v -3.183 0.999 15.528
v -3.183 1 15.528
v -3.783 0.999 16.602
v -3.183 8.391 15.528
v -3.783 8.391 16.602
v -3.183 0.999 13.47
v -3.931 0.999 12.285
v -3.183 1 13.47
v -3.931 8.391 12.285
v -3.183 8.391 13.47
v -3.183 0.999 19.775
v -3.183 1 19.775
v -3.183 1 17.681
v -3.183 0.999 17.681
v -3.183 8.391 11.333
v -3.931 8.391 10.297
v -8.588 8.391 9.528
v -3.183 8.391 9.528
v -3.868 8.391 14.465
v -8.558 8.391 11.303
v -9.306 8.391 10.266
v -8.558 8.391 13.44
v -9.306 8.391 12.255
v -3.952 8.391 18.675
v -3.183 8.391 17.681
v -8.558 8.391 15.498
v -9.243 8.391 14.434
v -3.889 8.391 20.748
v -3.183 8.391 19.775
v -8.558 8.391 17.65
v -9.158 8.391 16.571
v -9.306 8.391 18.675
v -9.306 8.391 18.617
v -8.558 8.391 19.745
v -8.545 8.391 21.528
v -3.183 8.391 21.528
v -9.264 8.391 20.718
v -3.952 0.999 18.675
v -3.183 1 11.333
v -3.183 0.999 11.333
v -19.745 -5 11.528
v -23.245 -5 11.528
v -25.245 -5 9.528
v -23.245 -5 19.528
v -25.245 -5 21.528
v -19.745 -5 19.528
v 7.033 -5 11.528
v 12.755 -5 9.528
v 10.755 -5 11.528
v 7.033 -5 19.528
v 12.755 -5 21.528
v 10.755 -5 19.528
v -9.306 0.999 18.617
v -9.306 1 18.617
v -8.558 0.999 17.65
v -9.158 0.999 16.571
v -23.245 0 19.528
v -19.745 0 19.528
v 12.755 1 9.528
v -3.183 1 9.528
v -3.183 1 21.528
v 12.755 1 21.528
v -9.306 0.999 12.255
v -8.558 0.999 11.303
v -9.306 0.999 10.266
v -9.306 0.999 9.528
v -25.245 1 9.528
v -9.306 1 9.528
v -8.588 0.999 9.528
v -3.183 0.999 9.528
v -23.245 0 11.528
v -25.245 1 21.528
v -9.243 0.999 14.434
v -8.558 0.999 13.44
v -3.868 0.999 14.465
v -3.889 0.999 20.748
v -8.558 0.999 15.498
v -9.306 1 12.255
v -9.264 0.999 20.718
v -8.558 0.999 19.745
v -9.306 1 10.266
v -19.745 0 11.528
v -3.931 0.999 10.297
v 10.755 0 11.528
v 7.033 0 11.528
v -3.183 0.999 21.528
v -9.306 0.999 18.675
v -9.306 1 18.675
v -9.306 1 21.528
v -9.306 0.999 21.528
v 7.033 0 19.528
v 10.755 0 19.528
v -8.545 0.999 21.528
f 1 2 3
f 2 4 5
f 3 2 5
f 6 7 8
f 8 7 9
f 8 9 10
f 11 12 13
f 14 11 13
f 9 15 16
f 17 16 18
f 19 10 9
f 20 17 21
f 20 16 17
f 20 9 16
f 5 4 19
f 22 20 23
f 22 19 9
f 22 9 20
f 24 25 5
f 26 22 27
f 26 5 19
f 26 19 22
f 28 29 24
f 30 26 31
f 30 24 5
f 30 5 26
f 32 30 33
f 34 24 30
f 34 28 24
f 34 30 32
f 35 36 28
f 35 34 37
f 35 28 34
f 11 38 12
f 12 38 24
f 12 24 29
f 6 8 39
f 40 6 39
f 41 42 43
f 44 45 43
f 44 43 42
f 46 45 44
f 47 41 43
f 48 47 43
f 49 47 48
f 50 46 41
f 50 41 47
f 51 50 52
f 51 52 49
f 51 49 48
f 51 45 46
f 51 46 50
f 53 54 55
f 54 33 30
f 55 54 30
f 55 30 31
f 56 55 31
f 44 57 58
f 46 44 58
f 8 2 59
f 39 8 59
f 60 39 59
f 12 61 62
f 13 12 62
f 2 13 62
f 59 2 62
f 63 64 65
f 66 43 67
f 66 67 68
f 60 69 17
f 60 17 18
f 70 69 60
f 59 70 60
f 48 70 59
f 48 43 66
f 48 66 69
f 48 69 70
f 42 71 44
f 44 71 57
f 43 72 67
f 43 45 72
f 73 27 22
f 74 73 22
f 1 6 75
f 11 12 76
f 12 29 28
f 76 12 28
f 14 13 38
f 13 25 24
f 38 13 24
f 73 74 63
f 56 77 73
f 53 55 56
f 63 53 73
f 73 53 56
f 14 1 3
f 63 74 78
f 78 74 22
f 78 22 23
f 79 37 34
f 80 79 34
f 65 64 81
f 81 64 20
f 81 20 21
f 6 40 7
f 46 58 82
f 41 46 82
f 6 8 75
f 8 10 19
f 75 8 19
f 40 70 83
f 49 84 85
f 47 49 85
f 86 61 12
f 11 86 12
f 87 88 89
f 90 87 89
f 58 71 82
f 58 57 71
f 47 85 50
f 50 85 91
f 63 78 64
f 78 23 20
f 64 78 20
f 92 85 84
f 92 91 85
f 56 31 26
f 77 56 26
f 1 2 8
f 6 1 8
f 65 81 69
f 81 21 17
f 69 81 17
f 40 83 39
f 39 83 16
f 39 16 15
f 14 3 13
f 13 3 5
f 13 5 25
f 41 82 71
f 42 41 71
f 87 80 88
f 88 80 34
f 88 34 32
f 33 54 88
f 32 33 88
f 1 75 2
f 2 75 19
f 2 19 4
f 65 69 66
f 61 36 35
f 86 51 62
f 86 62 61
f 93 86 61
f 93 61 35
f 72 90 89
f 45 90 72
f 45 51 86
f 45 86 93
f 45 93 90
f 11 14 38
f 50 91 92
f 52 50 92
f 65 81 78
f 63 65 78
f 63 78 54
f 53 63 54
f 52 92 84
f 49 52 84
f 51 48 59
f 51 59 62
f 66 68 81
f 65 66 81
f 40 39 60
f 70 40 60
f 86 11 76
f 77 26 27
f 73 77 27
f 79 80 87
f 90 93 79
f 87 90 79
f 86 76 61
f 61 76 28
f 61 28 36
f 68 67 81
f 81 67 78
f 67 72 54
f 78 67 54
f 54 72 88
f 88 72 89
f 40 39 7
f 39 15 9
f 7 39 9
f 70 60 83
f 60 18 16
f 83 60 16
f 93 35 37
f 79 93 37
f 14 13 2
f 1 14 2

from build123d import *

# Parameters (mm, degrees)
F1_DEPTH = 5
F2_DEPTH = 1
F4_DEPTH = 7.3914
F6_DEPTH = 7.39191


with BuildPart() as f1:
    # F0 (on Front) → F1 (new body)
    with BuildSketch(Plane.XZ):
        Polygon((-25.2447519526, 9.528346464), (12.7552480474, 9.528346464), (12.7552480474, 21.528346464), (7.0332471505, 21.528346464), (-19.9667528495, 21.528346464), (-25.2447519526, 21.528346464), align=None)
        Polygon((-19.7447519526, 11.528346464), (-23.2447519526, 11.528346464), (-23.2447519526, 19.528346464), (-19.7447519526, 19.528346464), (7.0332471505, 19.528346464), (10.7552480474, 19.528346464), (10.7552480474, 11.528346464), (7.0332471505, 11.528346464), align=None, mode=Mode.SUBTRACT)
        Polygon((-19.7447519526, 17.1880803001), (-19.7447519526, 11.528346464), (7.0332471505, 11.528346464), (7.0332471505, 13.5917593283), (7.0332471505, 19.528346464), (-19.7447519526, 19.528346464), align=None)
    extrude(amount=F1_DEPTH)

    # F0 (on Front) → F2 (join)
    with BuildSketch(Plane.XZ):
        Polygon((-25.2447519526, 9.528346464), (12.7552480474, 9.528346464), (12.7552480474, 21.528346464), (7.0332471505, 21.528346464), (-19.9667528495, 21.528346464), (-25.2447519526, 21.528346464), align=None)
        Polygon((-19.7447519526, 11.528346464), (-23.2447519526, 11.528346464), (-23.2447519526, 19.528346464), (-19.7447519526, 19.528346464), (7.0332471505, 19.528346464), (10.7552480474, 19.528346464), (10.7552480474, 11.528346464), (7.0332471505, 11.528346464), align=None, mode=Mode.SUBTRACT)
        Polygon((-19.7447519526, 17.1880803001), (-19.7447519526, 11.528346464), (7.0332471505, 11.528346464), (7.0332471505, 13.5917593283), (7.0332471505, 19.528346464), (-19.7447519526, 19.528346464), align=None)
        Polygon((7.0332471505, 13.5917593283), (7.0332471505, 11.528346464), (10.7552480474, 11.528346464), (10.7552480474, 19.528346464), (7.0332471505, 19.528346464), align=None)
        Polygon((-23.2447519526, 19.528346464), (-23.2447519526, 11.528346464), (-19.7447519526, 11.528346464), (-19.7447519526, 17.1880803001), (-19.7447519526, 19.528346464), align=None)
    extrude(amount=-F2_DEPTH)

    # F3 (on face) → F4 (join)
    with BuildSketch(Plane(origin=(0, 1, 0), x_dir=(-1, 0, 0), z_dir=(0, 1, 0))):
        Polygon((9.3062466048, 21.528346464), (3.1832573004, 21.528346464), (3.1832573004, 18.1184094399), (3.1832573004, 9.528346464), (9.3062466048, 9.528346464), (9.3062466048, 18.1184094399), align=None)
    extrude(amount=F4_DEPTH)

    # F5 (on face) → F6 (cut)
    with BuildSketch(Plane(origin=(0, 8.3914, 0), x_dir=(-1, 0, 0), z_dir=(0, 1, 0))):
        Polygon((9.3062466048, 21.528346464), (8.5453148931, 21.528346464), (9.2639319636, 20.7179207355), (8.5584444031, 19.7446867824), (9.3062466048, 18.6747785349), align=None)
        Polygon((9.3062466048, 12.255012989), (9.3062466048, 18.6171480624), (8.5584444031, 17.650116235), (9.1581455935, 16.5710970759), (8.5584444031, 15.4978624135), (9.242774643, 14.4342118874), (8.5584444031, 13.4398201481), align=None)
        Polygon((9.3062466048, 10.2662295103), (9.3062466048, 12.255012989), (8.5584444031, 11.3029358909), align=None)
        Polygon((9.3062466048, 9.528346464), (9.3062466048, 10.2662295103), (8.5881125659, 9.528346464), align=None)
        Polygon((3.9310595021, 10.2967135608), (3.1832573004, 11.3334199414), (3.1832573004, 9.528346464), align=None)
        Polygon((3.9310595021, 12.2854970396), (3.1832573004, 13.4703041986), (3.1832573004, 11.3334199414), align=None)
        Polygon((3.8675875403, 14.4646959379), (3.1832573004, 15.528346464), (3.1832573004, 13.4703041986), align=None)
        Polygon((3.7829584908, 16.6015811265), (3.1832573004, 17.6806002855), (3.1832573004, 15.528346464), align=None)
        Polygon((3.9522168227, 18.6749920249), (3.1832573004, 19.7751708329), (3.1832573004, 17.6806002855), align=None)
        Polygon((3.8887448609, 20.748404786), (3.1832573004, 21.528346464), (3.1832573004, 19.7751708329), align=None)
    extrude(amount=-F6_DEPTH, mode=Mode.SUBTRACT)


solid = f1.part
